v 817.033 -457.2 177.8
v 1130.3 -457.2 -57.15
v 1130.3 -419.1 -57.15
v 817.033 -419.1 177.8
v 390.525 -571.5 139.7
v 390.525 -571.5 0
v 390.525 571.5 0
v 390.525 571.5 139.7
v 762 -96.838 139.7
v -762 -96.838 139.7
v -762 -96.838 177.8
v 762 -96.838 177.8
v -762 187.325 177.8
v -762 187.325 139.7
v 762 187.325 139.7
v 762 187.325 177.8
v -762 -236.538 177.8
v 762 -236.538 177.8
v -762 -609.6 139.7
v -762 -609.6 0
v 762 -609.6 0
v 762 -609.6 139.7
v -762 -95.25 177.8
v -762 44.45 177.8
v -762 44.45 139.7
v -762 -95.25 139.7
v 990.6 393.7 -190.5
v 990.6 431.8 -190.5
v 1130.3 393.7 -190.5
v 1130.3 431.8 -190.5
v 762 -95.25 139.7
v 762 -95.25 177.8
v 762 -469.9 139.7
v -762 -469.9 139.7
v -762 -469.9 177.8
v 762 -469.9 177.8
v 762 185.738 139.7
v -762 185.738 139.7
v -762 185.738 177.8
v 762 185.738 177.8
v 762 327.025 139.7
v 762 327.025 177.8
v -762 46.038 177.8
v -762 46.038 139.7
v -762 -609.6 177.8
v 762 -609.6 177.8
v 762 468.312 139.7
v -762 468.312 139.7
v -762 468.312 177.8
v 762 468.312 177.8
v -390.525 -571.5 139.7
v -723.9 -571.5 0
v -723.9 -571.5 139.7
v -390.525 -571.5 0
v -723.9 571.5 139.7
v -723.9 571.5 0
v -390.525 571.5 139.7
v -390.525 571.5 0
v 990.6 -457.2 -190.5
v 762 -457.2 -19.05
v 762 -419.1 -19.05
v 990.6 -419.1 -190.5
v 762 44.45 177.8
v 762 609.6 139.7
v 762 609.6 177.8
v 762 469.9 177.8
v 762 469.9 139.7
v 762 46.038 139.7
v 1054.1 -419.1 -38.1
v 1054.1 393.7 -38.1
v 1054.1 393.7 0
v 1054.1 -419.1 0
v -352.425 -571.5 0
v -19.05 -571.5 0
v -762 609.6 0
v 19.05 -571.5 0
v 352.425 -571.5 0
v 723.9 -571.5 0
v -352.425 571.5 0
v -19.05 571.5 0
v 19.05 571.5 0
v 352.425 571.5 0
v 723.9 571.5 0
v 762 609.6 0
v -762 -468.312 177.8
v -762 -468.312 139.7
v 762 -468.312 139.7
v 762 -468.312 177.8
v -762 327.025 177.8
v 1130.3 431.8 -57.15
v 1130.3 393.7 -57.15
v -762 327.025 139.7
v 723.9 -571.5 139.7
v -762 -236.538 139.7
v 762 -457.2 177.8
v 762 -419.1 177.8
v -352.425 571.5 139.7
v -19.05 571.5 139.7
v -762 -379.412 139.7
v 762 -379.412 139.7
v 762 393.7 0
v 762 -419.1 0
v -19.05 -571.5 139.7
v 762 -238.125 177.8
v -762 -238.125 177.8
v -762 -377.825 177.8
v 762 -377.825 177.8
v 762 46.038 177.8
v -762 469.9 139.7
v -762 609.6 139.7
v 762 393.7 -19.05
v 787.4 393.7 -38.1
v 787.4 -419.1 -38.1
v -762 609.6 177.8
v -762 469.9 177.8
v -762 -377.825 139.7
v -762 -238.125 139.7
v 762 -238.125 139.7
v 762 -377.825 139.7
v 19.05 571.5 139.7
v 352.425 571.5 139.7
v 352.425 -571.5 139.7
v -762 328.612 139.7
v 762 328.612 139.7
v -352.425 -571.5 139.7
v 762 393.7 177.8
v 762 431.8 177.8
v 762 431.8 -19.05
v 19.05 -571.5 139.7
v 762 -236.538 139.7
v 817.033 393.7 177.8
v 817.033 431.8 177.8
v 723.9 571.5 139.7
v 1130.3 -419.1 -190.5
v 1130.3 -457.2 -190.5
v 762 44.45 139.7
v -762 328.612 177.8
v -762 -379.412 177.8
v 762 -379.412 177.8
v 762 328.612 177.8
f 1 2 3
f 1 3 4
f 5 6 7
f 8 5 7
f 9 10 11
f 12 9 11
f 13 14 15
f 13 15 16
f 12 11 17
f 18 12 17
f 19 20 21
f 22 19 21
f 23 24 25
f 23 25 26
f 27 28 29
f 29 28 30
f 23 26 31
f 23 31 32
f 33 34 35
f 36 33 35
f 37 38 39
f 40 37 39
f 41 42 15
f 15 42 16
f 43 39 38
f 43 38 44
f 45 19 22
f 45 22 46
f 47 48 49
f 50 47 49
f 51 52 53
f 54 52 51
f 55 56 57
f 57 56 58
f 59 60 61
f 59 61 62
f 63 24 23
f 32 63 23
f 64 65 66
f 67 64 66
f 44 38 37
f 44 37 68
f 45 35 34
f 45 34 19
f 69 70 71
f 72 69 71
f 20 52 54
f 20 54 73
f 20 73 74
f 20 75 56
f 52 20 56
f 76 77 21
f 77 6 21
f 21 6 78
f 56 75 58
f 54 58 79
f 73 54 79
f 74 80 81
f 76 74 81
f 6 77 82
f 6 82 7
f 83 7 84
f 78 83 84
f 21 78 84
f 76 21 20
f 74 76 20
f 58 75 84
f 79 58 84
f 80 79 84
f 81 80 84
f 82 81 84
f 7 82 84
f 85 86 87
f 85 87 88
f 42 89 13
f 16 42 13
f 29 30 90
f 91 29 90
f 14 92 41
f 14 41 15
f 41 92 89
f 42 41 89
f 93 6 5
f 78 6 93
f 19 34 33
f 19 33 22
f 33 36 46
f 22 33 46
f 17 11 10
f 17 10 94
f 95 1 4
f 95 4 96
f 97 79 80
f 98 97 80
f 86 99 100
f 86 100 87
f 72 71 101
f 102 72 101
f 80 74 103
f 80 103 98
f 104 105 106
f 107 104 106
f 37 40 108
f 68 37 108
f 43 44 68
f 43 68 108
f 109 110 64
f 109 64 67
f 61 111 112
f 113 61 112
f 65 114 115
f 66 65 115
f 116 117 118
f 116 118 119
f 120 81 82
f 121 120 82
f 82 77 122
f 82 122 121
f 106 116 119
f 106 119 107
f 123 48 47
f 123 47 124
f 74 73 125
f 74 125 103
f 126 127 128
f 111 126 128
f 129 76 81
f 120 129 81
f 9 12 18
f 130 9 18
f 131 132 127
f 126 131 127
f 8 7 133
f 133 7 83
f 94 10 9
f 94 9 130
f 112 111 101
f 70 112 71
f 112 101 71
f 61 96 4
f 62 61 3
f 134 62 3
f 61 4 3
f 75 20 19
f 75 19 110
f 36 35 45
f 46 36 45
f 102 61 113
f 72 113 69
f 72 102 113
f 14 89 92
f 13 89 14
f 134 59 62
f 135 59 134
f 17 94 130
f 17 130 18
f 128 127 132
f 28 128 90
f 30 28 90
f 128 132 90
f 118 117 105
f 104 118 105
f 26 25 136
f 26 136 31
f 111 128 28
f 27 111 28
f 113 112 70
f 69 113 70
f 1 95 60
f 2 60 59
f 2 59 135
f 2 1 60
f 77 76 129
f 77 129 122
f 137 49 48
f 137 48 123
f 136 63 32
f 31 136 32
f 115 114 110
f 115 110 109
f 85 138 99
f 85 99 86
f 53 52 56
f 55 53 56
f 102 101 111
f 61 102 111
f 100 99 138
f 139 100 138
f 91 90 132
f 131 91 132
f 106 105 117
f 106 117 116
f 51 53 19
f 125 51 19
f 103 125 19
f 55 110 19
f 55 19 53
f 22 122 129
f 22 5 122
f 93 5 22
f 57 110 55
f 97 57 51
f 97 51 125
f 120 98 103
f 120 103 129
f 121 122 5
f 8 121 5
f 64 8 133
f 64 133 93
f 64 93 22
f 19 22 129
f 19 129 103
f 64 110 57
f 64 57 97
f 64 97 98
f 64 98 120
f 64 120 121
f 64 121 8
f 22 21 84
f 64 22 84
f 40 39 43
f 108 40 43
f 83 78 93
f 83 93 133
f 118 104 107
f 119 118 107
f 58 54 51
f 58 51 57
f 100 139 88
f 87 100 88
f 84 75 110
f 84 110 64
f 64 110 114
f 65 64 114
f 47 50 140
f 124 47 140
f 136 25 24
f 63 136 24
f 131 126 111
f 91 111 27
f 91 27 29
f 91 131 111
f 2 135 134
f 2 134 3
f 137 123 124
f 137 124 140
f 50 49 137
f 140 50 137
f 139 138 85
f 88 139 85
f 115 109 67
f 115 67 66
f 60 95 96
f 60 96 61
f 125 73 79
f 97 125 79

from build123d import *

# Parameters (mm, degrees)
F0_W      = 1524
F0_H      = 1219.2
F0_W_2    = 333.375
F0_H_2    = 1143
F1_DEPTH  = 139.7
F2_W      = 139.7
F2_H      = 38.1
F3_DEPTH  = 1524
F2_W_2    = 88.9
F6_DEPTH  = 38.1
F10_DEPTH = 812.8


with BuildPart() as f1:
    # F0 (on Top) → F1 (new body)
    with BuildSketch(Plane.XY):
        Rectangle(F0_W, F0_H)
        with Locations((-557.2125, 0)):
            Rectangle(F0_W_2, F0_H_2, mode=Mode.SUBTRACT)
        with Locations((-185.7375, 0)):
            Rectangle(F0_W_2, F0_H_2, mode=Mode.SUBTRACT)
        with Locations((185.7375, 0)):
            Rectangle(F0_W_2, F0_H_2, mode=Mode.SUBTRACT)
        with Locations((557.2125, 0)):
            Rectangle(F0_W_2, F0_H_2, mode=Mode.SUBTRACT)
    extrude(amount=F1_DEPTH)


with BuildPart() as f3:
    # F2 (on face) → F3 (new body, through all)
    with BuildSketch(Plane(origin=(-762, 0, 0), x_dir=(0, -1, 0), z_dir=(-1, 0, 0))):
        with Locations((-115.8875, 158.75)):
            Rectangle(F2_W, F2_H)
    extrude(amount=-F3_DEPTH)


with BuildPart() as f3b:
    # F2 (on face) → F3, piece 2 (new body, through all)
    with BuildSketch(Plane(origin=(-762, 0, 0), x_dir=(0, -1, 0), z_dir=(-1, 0, 0))):
        with Locations((25.4, 158.75)):
            Rectangle(F2_W, F2_H)
    extrude(amount=-F3_DEPTH)


with BuildPart() as f3c:
    # F2 (on face) → F3, piece 3 (new body, through all)
    with BuildSketch(Plane(origin=(-762, 0, 0), x_dir=(0, -1, 0), z_dir=(-1, 0, 0))):
        with Locations((423.8625, 158.75)):
            Rectangle(F2_W_2, F2_H)
    extrude(amount=-F3_DEPTH)


with BuildPart() as f3d:
    # F2 (on face) → F3, piece 4 (new body, through all)
    with BuildSketch(Plane(origin=(-762, 0, 0), x_dir=(0, -1, 0), z_dir=(-1, 0, 0))):
        with Locations((539.75, 158.75)):
            Rectangle(F2_W, F2_H)
    extrude(amount=-F3_DEPTH)


with BuildPart() as f3e:
    # F2 (on face) → F3, piece 5 (new body, through all)
    with BuildSketch(Plane(origin=(-762, 0, 0), x_dir=(0, -1, 0), z_dir=(-1, 0, 0))):
        with Locations((166.6875, 158.75)):
            Rectangle(F2_W, F2_H)
    extrude(amount=-F3_DEPTH)


with BuildPart() as f3f:
    # F2 (on face) → F3, piece 6 (new body, through all)
    with BuildSketch(Plane(origin=(-762, 0, 0), x_dir=(0, -1, 0), z_dir=(-1, 0, 0))):
        with Locations((307.975, 158.75)):
            Rectangle(F2_W, F2_H)
    extrude(amount=-F3_DEPTH)


with BuildPart() as f3g:
    # F2 (on face) → F3, piece 7 (new body, through all)
    with BuildSketch(Plane(origin=(-762, 0, 0), x_dir=(0, -1, 0), z_dir=(-1, 0, 0))):
        with Locations((-539.75, 158.75)):
            Rectangle(F2_W, F2_H)
    extrude(amount=-F3_DEPTH)


with BuildPart() as f3h:
    # F2 (on face) → F3, piece 8 (new body, through all)
    with BuildSketch(Plane(origin=(-762, 0, 0), x_dir=(0, -1, 0), z_dir=(-1, 0, 0))):
        with Locations((-398.4625, 158.75)):
            Rectangle(F2_W, F2_H)
    extrude(amount=-F3_DEPTH)


with BuildPart() as f3i:
    # F2 (on face) → F3, piece 9 (new body, through all)
    with BuildSketch(Plane(origin=(-762, 0, 0), x_dir=(0, -1, 0), z_dir=(-1, 0, 0))):
        with Locations((-257.175, 158.75)):
            Rectangle(F2_W, F2_H)
    extrude(amount=-F3_DEPTH)


with BuildPart() as f6:
    # F5 (on offset) → F6 (new body)
    with BuildSketch(Plane.XZ.offset(457.2)):
        Polygon((817.0333333333, 177.8), (762, 177.8), (762, -19.05), (990.6, -190.5), (1130.3, -190.5), (1130.3, -57.15), align=None)
    extrude(amount=-F6_DEPTH)


with BuildPart() as f8_1:
    # F8: instance of F6
    add(f6.part.mirror(Plane(origin=(935.8203603196, -12.7, -24.0918023519), x_dir=(1, 0, 0), z_dir=(0, 1, 0))))


with BuildPart() as f10:
    # F9 (on face) → F10 (new body, through all)
    with BuildSketch(Plane.XZ.offset(-393.7)):
        Polygon((1054.1, 0), (762, 0), (762, -19.05), (787.4, -38.1), (1054.1, -38.1), align=None)
    extrude(amount=F10_DEPTH)


solid = Compound([f1.part, f3.part, f3b.part, f3c.part, f3d.part, f3e.part, f3f.part, f3g.part, f3h.part, f3i.part, f6.part, f8_1.part, f10.part])
